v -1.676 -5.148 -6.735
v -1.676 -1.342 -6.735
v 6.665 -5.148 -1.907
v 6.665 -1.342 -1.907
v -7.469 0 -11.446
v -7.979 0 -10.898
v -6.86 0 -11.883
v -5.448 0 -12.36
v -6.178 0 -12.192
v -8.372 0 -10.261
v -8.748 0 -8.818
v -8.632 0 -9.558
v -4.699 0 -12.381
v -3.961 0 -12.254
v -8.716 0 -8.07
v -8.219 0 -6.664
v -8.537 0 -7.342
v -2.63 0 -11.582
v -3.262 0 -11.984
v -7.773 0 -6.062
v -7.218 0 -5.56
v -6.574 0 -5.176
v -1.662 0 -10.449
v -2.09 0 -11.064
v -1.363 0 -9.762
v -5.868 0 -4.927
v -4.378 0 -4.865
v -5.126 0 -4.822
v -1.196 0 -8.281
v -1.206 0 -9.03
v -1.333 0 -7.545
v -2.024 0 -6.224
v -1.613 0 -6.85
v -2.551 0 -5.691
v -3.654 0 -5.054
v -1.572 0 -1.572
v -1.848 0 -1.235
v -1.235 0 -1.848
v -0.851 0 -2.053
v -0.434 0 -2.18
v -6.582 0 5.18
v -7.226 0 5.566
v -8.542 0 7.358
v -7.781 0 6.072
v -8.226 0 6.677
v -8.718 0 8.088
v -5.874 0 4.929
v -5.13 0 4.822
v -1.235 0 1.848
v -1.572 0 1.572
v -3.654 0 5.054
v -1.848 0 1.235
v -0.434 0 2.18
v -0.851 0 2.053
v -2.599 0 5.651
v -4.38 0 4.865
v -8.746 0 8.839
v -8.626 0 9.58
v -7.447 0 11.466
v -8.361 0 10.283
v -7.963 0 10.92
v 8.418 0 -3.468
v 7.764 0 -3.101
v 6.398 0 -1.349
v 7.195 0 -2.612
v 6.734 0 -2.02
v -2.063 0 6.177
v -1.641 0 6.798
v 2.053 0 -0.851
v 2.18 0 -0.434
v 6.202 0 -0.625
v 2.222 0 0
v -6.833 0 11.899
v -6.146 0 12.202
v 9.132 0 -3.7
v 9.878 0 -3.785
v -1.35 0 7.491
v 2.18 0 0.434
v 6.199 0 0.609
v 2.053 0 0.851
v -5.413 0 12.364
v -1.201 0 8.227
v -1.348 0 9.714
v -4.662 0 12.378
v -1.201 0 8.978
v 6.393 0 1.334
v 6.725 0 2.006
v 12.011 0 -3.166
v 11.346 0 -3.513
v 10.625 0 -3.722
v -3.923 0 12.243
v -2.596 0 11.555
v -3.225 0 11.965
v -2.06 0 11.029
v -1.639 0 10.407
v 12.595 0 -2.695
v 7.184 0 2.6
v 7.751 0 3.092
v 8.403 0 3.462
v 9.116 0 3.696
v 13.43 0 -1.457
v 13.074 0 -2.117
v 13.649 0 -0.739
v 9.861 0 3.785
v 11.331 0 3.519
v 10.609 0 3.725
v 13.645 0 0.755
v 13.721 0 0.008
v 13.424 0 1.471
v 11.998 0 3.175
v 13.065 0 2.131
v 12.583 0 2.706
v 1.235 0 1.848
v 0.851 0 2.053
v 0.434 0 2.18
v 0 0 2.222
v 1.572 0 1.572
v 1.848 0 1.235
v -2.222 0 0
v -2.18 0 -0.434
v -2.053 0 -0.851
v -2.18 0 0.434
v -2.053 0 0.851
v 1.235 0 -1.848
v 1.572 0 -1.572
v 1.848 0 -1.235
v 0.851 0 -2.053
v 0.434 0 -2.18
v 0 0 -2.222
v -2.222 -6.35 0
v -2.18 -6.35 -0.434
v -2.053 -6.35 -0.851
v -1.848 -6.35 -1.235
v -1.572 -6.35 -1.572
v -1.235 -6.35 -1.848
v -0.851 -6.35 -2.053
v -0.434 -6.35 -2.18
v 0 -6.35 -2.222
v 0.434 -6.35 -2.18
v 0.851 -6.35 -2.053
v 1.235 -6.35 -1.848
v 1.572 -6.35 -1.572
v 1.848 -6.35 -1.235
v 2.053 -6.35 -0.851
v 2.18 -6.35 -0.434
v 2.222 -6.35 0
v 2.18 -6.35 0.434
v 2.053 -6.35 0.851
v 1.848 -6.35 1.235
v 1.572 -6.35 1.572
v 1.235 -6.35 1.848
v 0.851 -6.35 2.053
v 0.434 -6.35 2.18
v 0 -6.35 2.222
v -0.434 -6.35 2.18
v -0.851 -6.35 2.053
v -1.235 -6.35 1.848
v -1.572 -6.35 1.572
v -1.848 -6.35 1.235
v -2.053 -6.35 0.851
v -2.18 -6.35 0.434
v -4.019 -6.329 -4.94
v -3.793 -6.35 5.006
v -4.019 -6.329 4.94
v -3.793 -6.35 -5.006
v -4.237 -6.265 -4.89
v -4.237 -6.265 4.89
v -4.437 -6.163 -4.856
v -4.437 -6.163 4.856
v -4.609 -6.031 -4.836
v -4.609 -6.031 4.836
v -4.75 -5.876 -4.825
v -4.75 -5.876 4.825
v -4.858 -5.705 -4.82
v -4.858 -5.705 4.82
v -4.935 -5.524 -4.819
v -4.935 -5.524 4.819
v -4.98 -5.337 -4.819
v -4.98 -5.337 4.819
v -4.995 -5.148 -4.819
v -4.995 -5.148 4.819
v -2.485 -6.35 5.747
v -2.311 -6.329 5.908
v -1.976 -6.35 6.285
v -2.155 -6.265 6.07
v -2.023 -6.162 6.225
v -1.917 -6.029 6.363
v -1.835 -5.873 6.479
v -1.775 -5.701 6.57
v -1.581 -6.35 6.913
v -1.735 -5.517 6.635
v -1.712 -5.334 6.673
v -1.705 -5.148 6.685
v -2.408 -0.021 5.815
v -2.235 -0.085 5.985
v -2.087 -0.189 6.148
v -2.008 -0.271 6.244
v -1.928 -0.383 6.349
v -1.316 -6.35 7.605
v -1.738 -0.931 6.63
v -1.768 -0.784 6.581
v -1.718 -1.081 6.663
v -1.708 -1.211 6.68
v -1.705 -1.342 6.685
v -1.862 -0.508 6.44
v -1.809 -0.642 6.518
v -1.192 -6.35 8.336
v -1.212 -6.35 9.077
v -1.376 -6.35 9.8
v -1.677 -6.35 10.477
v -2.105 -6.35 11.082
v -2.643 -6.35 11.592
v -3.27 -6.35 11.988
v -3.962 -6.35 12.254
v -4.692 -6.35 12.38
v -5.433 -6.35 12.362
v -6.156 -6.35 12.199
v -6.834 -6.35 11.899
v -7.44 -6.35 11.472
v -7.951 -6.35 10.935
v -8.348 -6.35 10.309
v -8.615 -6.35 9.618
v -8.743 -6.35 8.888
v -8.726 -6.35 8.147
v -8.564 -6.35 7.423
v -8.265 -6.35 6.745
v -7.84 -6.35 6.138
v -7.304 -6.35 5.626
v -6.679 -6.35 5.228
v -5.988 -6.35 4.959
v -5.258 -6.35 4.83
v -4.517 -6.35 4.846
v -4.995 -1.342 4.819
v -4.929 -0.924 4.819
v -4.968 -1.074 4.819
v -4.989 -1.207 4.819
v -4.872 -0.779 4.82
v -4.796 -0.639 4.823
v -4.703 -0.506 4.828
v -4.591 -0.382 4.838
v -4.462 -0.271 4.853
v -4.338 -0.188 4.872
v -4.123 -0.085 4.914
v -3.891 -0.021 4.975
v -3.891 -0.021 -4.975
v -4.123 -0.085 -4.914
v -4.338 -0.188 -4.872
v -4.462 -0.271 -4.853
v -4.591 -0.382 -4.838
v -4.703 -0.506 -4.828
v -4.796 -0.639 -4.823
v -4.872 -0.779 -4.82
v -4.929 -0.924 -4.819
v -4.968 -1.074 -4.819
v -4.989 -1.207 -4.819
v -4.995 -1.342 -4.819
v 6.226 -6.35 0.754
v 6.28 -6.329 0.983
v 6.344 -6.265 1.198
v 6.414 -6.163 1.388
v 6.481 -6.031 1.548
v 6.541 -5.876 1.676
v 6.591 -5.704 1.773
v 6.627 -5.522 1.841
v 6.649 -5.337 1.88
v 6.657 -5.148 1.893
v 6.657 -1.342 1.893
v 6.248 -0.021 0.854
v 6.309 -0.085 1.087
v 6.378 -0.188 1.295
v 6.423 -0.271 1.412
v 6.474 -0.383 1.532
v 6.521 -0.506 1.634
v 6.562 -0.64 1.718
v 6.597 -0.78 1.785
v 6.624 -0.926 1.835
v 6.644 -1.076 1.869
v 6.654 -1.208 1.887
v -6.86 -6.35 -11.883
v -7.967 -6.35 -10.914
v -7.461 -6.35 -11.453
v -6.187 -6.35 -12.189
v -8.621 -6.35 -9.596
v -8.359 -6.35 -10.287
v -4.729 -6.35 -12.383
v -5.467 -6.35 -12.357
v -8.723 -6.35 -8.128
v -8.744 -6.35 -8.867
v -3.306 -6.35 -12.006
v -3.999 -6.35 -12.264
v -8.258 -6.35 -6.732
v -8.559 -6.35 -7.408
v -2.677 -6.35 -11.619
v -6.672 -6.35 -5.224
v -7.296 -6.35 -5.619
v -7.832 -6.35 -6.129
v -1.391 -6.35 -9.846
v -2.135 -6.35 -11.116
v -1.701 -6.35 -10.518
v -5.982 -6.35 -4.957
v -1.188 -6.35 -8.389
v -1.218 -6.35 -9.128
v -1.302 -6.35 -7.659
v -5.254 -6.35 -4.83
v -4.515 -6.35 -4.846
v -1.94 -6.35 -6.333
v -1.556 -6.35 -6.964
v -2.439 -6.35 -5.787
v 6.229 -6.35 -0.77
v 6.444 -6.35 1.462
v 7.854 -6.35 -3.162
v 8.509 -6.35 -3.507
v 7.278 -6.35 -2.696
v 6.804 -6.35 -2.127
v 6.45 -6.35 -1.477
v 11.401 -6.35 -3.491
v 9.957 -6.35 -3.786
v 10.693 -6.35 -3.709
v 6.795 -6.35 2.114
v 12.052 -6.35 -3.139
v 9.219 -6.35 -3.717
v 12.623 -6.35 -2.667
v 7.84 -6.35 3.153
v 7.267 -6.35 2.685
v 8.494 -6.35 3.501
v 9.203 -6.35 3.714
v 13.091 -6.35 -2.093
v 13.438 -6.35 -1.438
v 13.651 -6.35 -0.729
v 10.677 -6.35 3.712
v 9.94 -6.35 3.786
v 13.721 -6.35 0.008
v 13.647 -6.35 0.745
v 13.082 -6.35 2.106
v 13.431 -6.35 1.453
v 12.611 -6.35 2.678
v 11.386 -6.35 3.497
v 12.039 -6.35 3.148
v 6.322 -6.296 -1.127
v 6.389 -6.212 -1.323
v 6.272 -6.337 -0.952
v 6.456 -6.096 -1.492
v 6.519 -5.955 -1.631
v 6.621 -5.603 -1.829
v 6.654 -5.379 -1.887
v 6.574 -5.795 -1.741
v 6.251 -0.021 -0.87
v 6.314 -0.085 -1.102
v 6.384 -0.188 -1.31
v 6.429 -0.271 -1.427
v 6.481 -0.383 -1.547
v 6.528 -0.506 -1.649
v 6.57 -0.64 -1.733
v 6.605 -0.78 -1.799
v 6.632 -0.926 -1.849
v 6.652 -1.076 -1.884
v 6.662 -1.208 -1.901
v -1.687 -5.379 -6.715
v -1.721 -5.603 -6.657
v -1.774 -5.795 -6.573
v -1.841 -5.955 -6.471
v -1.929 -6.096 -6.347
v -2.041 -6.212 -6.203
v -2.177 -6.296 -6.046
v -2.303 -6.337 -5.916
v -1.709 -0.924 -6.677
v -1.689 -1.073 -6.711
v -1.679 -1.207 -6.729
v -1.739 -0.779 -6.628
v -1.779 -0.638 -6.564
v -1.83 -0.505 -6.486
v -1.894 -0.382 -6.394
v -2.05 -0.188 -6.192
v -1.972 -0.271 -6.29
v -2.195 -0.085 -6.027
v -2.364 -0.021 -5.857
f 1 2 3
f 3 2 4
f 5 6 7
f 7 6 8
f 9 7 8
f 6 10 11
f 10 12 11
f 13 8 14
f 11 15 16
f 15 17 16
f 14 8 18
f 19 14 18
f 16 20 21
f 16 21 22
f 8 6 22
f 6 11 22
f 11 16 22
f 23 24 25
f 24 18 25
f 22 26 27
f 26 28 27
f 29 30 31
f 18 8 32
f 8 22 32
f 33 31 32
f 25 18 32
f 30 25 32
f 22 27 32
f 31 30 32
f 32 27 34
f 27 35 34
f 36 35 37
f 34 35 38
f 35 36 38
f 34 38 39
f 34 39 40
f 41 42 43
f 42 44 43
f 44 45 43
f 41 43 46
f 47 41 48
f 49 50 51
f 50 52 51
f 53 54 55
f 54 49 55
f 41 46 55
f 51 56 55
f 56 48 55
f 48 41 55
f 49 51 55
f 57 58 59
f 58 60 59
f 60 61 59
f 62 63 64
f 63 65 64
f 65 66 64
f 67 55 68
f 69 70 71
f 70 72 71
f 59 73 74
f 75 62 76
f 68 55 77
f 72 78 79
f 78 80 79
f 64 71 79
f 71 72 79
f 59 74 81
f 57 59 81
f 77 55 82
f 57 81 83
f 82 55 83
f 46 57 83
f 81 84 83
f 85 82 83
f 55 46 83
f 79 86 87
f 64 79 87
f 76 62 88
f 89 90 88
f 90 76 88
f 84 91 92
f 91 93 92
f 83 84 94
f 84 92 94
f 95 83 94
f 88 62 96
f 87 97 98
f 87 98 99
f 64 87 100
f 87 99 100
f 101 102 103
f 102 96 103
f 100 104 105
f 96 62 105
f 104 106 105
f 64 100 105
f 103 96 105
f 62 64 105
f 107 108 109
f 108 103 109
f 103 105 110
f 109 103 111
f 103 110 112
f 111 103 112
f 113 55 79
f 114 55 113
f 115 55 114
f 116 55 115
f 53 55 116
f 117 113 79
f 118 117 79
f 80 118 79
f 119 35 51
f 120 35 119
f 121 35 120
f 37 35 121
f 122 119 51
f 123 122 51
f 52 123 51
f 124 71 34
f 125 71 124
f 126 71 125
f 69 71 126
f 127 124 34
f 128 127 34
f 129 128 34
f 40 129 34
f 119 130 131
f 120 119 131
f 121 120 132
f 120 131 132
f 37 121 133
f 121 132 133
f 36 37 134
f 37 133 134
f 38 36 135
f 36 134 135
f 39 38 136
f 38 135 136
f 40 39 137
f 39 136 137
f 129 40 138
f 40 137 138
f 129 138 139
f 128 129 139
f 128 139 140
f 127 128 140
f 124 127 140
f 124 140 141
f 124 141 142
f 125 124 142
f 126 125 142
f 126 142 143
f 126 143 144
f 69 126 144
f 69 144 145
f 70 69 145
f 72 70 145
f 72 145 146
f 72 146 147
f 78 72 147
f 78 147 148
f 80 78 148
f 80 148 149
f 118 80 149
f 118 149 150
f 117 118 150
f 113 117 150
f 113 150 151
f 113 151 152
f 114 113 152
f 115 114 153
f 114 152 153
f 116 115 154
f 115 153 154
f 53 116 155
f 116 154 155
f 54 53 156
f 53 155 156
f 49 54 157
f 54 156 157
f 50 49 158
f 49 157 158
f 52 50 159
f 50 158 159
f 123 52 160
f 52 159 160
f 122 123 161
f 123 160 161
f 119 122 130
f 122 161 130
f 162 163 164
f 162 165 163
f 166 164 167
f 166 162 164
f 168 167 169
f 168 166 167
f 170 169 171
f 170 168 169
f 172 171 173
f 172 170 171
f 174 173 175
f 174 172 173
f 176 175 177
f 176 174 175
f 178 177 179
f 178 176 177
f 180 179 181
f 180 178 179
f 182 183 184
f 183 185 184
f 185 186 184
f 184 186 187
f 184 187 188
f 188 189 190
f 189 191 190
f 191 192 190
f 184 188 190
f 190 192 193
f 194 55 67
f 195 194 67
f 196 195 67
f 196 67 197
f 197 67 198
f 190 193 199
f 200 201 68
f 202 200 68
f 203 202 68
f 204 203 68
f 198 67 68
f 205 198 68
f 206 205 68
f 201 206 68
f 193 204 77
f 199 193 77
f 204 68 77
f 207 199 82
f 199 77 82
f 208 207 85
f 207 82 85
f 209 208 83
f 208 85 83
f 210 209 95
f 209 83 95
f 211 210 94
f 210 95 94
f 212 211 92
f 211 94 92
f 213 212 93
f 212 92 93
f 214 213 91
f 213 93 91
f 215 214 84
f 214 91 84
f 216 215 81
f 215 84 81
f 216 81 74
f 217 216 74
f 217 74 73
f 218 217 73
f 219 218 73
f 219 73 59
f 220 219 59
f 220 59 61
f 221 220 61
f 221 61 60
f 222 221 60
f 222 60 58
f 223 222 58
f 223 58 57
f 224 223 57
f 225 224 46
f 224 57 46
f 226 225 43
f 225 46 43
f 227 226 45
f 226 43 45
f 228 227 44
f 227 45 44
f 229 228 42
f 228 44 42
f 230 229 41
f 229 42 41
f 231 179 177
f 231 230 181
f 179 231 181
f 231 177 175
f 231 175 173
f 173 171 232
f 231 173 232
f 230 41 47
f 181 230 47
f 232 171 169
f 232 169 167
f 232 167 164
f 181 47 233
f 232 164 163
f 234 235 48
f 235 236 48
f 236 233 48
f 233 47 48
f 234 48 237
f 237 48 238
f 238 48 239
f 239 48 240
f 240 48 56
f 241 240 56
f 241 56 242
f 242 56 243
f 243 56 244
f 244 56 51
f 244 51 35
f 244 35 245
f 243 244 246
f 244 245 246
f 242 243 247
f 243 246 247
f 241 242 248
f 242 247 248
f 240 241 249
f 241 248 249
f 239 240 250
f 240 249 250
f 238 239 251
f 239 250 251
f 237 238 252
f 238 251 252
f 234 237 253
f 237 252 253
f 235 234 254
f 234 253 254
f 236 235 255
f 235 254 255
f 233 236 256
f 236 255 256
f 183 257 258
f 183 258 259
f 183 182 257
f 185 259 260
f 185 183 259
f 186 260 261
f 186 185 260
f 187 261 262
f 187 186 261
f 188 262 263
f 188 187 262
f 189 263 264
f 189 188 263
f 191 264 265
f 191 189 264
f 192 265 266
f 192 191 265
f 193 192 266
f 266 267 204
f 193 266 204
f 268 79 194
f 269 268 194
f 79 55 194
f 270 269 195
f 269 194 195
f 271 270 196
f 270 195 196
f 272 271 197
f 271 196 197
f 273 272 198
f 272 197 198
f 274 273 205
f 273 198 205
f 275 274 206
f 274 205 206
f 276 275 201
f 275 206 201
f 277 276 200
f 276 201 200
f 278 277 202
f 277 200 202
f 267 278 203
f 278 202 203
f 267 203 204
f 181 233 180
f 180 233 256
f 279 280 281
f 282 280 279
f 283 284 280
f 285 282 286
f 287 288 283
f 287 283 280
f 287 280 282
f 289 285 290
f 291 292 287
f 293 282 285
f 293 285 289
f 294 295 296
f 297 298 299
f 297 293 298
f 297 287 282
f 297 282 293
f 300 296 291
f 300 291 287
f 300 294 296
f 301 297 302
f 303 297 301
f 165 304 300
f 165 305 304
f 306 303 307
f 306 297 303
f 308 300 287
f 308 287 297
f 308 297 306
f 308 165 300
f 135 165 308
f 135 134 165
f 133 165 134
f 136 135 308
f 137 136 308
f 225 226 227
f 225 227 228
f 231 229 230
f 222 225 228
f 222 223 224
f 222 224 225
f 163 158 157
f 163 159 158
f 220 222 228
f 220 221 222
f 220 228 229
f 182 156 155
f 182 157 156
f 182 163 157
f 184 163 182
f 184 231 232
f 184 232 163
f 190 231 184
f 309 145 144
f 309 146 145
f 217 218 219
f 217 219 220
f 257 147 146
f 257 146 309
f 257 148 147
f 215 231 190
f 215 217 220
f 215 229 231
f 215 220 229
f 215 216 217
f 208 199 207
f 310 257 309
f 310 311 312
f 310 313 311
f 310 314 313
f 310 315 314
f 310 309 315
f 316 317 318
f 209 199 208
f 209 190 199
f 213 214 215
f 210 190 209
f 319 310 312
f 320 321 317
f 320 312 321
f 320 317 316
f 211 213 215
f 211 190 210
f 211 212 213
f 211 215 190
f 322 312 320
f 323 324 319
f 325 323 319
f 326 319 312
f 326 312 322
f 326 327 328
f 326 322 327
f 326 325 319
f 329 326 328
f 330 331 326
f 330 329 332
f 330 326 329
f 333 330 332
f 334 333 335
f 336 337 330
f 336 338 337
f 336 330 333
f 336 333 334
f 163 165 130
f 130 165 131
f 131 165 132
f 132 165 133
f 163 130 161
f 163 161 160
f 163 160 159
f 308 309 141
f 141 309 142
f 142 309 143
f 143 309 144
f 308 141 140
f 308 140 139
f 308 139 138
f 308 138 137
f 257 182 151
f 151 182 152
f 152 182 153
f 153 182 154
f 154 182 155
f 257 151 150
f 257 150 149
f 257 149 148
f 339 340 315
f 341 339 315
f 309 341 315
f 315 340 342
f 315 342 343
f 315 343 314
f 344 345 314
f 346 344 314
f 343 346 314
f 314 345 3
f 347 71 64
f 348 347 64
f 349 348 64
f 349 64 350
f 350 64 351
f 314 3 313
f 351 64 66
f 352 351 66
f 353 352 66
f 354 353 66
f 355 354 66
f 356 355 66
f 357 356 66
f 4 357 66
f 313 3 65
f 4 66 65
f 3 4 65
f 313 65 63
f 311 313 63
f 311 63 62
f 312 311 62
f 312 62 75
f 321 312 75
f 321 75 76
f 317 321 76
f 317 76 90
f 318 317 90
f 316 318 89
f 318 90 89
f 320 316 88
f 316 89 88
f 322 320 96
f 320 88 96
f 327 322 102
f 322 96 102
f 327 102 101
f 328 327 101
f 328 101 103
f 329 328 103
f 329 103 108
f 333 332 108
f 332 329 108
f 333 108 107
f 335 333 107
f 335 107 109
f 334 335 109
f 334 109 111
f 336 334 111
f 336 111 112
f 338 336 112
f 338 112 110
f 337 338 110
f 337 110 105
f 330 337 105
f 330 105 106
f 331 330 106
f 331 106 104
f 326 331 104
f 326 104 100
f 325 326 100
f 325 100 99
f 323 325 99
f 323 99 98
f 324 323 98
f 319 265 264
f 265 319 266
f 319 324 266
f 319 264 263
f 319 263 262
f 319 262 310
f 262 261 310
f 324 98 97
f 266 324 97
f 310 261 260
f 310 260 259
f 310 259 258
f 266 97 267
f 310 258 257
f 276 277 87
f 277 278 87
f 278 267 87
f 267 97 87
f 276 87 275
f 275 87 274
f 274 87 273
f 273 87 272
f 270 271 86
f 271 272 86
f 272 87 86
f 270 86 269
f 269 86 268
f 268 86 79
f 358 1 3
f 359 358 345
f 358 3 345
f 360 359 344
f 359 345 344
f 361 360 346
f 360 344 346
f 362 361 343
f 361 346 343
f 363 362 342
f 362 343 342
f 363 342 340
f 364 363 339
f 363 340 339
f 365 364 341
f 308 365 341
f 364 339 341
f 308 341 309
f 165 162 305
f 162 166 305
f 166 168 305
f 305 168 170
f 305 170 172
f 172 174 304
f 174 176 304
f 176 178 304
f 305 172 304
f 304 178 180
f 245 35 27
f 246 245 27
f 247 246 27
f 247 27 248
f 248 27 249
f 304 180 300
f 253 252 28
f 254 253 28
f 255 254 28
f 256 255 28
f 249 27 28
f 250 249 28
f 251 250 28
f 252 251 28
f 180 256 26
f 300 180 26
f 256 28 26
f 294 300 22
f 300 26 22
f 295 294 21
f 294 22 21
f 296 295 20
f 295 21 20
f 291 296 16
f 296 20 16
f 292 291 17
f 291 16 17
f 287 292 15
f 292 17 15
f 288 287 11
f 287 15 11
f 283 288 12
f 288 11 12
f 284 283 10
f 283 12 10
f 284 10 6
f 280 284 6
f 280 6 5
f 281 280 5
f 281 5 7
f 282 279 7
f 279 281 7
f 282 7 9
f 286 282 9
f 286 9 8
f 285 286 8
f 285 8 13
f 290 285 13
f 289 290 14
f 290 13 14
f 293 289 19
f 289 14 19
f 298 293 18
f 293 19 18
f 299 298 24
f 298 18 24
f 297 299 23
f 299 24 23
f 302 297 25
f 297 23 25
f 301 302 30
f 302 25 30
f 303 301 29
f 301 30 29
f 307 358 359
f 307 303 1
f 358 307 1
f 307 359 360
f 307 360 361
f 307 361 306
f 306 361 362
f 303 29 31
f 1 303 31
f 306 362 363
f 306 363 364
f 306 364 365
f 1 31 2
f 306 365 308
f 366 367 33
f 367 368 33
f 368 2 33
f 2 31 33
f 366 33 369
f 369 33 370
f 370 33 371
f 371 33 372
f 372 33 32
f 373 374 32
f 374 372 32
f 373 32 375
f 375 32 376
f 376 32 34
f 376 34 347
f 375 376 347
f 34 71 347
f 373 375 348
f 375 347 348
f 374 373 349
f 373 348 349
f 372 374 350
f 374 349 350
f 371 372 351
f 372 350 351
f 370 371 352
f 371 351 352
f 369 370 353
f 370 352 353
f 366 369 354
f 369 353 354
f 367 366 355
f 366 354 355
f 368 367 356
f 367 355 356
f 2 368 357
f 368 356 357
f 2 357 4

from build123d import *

# Parameters (mm, degrees)
F0_R     = 3.78575
F2_DEPTH = 6.35
F3_R     = 1.341607
F4_R     = 1.20213
F5_D     = 4.445


with BuildPart() as f2:
    # F0 (on Front) + F1 (on Front) → F2 (new body)
    with BuildSketch(Plane.XZ):
        with Locations((9.935658, 0)):
            Circle(F0_R)
        with Locations((-4.967829, 8.604533)):
            Circle(F0_R)
        with Locations((-4.967829, -8.604533)):
            Circle(F0_R)
    with BuildSketch(Plane.XZ):
        Polygon((9.958743, 0), (-4.995326, 8.571174), (-4.995326, -8.656174), align=None)
    extrude(amount=F2_DEPTH)

    # F3
    f3_edges = [f2.edges().sort_by_distance(p)[0] for p in [
        (2.476077, 0, 4.288815),
        (-4.995326, 0, 0),
        (2.494509, 0, -4.320677),
    ]]
    fillet(f3_edges, radius=F3_R)

    # F4
    f4_edges = [f2.edges().sort_by_distance(p)[0] for p in [
        (-4.995326, -6.35, 0),
        (2.476077, -6.35, 4.288815),
        (2.494509, -6.35, -4.320677),
    ]]
    fillet(f4_edges, radius=F4_R)

    # F5 (through all)
    with Locations(Plane(origin=(0, 0, 0), x_dir=(1, 0, 0), z_dir=(0, 1, 0))):
        with Locations((0, 0)):
            Hole(F5_D / 2)


solid = f2.part
